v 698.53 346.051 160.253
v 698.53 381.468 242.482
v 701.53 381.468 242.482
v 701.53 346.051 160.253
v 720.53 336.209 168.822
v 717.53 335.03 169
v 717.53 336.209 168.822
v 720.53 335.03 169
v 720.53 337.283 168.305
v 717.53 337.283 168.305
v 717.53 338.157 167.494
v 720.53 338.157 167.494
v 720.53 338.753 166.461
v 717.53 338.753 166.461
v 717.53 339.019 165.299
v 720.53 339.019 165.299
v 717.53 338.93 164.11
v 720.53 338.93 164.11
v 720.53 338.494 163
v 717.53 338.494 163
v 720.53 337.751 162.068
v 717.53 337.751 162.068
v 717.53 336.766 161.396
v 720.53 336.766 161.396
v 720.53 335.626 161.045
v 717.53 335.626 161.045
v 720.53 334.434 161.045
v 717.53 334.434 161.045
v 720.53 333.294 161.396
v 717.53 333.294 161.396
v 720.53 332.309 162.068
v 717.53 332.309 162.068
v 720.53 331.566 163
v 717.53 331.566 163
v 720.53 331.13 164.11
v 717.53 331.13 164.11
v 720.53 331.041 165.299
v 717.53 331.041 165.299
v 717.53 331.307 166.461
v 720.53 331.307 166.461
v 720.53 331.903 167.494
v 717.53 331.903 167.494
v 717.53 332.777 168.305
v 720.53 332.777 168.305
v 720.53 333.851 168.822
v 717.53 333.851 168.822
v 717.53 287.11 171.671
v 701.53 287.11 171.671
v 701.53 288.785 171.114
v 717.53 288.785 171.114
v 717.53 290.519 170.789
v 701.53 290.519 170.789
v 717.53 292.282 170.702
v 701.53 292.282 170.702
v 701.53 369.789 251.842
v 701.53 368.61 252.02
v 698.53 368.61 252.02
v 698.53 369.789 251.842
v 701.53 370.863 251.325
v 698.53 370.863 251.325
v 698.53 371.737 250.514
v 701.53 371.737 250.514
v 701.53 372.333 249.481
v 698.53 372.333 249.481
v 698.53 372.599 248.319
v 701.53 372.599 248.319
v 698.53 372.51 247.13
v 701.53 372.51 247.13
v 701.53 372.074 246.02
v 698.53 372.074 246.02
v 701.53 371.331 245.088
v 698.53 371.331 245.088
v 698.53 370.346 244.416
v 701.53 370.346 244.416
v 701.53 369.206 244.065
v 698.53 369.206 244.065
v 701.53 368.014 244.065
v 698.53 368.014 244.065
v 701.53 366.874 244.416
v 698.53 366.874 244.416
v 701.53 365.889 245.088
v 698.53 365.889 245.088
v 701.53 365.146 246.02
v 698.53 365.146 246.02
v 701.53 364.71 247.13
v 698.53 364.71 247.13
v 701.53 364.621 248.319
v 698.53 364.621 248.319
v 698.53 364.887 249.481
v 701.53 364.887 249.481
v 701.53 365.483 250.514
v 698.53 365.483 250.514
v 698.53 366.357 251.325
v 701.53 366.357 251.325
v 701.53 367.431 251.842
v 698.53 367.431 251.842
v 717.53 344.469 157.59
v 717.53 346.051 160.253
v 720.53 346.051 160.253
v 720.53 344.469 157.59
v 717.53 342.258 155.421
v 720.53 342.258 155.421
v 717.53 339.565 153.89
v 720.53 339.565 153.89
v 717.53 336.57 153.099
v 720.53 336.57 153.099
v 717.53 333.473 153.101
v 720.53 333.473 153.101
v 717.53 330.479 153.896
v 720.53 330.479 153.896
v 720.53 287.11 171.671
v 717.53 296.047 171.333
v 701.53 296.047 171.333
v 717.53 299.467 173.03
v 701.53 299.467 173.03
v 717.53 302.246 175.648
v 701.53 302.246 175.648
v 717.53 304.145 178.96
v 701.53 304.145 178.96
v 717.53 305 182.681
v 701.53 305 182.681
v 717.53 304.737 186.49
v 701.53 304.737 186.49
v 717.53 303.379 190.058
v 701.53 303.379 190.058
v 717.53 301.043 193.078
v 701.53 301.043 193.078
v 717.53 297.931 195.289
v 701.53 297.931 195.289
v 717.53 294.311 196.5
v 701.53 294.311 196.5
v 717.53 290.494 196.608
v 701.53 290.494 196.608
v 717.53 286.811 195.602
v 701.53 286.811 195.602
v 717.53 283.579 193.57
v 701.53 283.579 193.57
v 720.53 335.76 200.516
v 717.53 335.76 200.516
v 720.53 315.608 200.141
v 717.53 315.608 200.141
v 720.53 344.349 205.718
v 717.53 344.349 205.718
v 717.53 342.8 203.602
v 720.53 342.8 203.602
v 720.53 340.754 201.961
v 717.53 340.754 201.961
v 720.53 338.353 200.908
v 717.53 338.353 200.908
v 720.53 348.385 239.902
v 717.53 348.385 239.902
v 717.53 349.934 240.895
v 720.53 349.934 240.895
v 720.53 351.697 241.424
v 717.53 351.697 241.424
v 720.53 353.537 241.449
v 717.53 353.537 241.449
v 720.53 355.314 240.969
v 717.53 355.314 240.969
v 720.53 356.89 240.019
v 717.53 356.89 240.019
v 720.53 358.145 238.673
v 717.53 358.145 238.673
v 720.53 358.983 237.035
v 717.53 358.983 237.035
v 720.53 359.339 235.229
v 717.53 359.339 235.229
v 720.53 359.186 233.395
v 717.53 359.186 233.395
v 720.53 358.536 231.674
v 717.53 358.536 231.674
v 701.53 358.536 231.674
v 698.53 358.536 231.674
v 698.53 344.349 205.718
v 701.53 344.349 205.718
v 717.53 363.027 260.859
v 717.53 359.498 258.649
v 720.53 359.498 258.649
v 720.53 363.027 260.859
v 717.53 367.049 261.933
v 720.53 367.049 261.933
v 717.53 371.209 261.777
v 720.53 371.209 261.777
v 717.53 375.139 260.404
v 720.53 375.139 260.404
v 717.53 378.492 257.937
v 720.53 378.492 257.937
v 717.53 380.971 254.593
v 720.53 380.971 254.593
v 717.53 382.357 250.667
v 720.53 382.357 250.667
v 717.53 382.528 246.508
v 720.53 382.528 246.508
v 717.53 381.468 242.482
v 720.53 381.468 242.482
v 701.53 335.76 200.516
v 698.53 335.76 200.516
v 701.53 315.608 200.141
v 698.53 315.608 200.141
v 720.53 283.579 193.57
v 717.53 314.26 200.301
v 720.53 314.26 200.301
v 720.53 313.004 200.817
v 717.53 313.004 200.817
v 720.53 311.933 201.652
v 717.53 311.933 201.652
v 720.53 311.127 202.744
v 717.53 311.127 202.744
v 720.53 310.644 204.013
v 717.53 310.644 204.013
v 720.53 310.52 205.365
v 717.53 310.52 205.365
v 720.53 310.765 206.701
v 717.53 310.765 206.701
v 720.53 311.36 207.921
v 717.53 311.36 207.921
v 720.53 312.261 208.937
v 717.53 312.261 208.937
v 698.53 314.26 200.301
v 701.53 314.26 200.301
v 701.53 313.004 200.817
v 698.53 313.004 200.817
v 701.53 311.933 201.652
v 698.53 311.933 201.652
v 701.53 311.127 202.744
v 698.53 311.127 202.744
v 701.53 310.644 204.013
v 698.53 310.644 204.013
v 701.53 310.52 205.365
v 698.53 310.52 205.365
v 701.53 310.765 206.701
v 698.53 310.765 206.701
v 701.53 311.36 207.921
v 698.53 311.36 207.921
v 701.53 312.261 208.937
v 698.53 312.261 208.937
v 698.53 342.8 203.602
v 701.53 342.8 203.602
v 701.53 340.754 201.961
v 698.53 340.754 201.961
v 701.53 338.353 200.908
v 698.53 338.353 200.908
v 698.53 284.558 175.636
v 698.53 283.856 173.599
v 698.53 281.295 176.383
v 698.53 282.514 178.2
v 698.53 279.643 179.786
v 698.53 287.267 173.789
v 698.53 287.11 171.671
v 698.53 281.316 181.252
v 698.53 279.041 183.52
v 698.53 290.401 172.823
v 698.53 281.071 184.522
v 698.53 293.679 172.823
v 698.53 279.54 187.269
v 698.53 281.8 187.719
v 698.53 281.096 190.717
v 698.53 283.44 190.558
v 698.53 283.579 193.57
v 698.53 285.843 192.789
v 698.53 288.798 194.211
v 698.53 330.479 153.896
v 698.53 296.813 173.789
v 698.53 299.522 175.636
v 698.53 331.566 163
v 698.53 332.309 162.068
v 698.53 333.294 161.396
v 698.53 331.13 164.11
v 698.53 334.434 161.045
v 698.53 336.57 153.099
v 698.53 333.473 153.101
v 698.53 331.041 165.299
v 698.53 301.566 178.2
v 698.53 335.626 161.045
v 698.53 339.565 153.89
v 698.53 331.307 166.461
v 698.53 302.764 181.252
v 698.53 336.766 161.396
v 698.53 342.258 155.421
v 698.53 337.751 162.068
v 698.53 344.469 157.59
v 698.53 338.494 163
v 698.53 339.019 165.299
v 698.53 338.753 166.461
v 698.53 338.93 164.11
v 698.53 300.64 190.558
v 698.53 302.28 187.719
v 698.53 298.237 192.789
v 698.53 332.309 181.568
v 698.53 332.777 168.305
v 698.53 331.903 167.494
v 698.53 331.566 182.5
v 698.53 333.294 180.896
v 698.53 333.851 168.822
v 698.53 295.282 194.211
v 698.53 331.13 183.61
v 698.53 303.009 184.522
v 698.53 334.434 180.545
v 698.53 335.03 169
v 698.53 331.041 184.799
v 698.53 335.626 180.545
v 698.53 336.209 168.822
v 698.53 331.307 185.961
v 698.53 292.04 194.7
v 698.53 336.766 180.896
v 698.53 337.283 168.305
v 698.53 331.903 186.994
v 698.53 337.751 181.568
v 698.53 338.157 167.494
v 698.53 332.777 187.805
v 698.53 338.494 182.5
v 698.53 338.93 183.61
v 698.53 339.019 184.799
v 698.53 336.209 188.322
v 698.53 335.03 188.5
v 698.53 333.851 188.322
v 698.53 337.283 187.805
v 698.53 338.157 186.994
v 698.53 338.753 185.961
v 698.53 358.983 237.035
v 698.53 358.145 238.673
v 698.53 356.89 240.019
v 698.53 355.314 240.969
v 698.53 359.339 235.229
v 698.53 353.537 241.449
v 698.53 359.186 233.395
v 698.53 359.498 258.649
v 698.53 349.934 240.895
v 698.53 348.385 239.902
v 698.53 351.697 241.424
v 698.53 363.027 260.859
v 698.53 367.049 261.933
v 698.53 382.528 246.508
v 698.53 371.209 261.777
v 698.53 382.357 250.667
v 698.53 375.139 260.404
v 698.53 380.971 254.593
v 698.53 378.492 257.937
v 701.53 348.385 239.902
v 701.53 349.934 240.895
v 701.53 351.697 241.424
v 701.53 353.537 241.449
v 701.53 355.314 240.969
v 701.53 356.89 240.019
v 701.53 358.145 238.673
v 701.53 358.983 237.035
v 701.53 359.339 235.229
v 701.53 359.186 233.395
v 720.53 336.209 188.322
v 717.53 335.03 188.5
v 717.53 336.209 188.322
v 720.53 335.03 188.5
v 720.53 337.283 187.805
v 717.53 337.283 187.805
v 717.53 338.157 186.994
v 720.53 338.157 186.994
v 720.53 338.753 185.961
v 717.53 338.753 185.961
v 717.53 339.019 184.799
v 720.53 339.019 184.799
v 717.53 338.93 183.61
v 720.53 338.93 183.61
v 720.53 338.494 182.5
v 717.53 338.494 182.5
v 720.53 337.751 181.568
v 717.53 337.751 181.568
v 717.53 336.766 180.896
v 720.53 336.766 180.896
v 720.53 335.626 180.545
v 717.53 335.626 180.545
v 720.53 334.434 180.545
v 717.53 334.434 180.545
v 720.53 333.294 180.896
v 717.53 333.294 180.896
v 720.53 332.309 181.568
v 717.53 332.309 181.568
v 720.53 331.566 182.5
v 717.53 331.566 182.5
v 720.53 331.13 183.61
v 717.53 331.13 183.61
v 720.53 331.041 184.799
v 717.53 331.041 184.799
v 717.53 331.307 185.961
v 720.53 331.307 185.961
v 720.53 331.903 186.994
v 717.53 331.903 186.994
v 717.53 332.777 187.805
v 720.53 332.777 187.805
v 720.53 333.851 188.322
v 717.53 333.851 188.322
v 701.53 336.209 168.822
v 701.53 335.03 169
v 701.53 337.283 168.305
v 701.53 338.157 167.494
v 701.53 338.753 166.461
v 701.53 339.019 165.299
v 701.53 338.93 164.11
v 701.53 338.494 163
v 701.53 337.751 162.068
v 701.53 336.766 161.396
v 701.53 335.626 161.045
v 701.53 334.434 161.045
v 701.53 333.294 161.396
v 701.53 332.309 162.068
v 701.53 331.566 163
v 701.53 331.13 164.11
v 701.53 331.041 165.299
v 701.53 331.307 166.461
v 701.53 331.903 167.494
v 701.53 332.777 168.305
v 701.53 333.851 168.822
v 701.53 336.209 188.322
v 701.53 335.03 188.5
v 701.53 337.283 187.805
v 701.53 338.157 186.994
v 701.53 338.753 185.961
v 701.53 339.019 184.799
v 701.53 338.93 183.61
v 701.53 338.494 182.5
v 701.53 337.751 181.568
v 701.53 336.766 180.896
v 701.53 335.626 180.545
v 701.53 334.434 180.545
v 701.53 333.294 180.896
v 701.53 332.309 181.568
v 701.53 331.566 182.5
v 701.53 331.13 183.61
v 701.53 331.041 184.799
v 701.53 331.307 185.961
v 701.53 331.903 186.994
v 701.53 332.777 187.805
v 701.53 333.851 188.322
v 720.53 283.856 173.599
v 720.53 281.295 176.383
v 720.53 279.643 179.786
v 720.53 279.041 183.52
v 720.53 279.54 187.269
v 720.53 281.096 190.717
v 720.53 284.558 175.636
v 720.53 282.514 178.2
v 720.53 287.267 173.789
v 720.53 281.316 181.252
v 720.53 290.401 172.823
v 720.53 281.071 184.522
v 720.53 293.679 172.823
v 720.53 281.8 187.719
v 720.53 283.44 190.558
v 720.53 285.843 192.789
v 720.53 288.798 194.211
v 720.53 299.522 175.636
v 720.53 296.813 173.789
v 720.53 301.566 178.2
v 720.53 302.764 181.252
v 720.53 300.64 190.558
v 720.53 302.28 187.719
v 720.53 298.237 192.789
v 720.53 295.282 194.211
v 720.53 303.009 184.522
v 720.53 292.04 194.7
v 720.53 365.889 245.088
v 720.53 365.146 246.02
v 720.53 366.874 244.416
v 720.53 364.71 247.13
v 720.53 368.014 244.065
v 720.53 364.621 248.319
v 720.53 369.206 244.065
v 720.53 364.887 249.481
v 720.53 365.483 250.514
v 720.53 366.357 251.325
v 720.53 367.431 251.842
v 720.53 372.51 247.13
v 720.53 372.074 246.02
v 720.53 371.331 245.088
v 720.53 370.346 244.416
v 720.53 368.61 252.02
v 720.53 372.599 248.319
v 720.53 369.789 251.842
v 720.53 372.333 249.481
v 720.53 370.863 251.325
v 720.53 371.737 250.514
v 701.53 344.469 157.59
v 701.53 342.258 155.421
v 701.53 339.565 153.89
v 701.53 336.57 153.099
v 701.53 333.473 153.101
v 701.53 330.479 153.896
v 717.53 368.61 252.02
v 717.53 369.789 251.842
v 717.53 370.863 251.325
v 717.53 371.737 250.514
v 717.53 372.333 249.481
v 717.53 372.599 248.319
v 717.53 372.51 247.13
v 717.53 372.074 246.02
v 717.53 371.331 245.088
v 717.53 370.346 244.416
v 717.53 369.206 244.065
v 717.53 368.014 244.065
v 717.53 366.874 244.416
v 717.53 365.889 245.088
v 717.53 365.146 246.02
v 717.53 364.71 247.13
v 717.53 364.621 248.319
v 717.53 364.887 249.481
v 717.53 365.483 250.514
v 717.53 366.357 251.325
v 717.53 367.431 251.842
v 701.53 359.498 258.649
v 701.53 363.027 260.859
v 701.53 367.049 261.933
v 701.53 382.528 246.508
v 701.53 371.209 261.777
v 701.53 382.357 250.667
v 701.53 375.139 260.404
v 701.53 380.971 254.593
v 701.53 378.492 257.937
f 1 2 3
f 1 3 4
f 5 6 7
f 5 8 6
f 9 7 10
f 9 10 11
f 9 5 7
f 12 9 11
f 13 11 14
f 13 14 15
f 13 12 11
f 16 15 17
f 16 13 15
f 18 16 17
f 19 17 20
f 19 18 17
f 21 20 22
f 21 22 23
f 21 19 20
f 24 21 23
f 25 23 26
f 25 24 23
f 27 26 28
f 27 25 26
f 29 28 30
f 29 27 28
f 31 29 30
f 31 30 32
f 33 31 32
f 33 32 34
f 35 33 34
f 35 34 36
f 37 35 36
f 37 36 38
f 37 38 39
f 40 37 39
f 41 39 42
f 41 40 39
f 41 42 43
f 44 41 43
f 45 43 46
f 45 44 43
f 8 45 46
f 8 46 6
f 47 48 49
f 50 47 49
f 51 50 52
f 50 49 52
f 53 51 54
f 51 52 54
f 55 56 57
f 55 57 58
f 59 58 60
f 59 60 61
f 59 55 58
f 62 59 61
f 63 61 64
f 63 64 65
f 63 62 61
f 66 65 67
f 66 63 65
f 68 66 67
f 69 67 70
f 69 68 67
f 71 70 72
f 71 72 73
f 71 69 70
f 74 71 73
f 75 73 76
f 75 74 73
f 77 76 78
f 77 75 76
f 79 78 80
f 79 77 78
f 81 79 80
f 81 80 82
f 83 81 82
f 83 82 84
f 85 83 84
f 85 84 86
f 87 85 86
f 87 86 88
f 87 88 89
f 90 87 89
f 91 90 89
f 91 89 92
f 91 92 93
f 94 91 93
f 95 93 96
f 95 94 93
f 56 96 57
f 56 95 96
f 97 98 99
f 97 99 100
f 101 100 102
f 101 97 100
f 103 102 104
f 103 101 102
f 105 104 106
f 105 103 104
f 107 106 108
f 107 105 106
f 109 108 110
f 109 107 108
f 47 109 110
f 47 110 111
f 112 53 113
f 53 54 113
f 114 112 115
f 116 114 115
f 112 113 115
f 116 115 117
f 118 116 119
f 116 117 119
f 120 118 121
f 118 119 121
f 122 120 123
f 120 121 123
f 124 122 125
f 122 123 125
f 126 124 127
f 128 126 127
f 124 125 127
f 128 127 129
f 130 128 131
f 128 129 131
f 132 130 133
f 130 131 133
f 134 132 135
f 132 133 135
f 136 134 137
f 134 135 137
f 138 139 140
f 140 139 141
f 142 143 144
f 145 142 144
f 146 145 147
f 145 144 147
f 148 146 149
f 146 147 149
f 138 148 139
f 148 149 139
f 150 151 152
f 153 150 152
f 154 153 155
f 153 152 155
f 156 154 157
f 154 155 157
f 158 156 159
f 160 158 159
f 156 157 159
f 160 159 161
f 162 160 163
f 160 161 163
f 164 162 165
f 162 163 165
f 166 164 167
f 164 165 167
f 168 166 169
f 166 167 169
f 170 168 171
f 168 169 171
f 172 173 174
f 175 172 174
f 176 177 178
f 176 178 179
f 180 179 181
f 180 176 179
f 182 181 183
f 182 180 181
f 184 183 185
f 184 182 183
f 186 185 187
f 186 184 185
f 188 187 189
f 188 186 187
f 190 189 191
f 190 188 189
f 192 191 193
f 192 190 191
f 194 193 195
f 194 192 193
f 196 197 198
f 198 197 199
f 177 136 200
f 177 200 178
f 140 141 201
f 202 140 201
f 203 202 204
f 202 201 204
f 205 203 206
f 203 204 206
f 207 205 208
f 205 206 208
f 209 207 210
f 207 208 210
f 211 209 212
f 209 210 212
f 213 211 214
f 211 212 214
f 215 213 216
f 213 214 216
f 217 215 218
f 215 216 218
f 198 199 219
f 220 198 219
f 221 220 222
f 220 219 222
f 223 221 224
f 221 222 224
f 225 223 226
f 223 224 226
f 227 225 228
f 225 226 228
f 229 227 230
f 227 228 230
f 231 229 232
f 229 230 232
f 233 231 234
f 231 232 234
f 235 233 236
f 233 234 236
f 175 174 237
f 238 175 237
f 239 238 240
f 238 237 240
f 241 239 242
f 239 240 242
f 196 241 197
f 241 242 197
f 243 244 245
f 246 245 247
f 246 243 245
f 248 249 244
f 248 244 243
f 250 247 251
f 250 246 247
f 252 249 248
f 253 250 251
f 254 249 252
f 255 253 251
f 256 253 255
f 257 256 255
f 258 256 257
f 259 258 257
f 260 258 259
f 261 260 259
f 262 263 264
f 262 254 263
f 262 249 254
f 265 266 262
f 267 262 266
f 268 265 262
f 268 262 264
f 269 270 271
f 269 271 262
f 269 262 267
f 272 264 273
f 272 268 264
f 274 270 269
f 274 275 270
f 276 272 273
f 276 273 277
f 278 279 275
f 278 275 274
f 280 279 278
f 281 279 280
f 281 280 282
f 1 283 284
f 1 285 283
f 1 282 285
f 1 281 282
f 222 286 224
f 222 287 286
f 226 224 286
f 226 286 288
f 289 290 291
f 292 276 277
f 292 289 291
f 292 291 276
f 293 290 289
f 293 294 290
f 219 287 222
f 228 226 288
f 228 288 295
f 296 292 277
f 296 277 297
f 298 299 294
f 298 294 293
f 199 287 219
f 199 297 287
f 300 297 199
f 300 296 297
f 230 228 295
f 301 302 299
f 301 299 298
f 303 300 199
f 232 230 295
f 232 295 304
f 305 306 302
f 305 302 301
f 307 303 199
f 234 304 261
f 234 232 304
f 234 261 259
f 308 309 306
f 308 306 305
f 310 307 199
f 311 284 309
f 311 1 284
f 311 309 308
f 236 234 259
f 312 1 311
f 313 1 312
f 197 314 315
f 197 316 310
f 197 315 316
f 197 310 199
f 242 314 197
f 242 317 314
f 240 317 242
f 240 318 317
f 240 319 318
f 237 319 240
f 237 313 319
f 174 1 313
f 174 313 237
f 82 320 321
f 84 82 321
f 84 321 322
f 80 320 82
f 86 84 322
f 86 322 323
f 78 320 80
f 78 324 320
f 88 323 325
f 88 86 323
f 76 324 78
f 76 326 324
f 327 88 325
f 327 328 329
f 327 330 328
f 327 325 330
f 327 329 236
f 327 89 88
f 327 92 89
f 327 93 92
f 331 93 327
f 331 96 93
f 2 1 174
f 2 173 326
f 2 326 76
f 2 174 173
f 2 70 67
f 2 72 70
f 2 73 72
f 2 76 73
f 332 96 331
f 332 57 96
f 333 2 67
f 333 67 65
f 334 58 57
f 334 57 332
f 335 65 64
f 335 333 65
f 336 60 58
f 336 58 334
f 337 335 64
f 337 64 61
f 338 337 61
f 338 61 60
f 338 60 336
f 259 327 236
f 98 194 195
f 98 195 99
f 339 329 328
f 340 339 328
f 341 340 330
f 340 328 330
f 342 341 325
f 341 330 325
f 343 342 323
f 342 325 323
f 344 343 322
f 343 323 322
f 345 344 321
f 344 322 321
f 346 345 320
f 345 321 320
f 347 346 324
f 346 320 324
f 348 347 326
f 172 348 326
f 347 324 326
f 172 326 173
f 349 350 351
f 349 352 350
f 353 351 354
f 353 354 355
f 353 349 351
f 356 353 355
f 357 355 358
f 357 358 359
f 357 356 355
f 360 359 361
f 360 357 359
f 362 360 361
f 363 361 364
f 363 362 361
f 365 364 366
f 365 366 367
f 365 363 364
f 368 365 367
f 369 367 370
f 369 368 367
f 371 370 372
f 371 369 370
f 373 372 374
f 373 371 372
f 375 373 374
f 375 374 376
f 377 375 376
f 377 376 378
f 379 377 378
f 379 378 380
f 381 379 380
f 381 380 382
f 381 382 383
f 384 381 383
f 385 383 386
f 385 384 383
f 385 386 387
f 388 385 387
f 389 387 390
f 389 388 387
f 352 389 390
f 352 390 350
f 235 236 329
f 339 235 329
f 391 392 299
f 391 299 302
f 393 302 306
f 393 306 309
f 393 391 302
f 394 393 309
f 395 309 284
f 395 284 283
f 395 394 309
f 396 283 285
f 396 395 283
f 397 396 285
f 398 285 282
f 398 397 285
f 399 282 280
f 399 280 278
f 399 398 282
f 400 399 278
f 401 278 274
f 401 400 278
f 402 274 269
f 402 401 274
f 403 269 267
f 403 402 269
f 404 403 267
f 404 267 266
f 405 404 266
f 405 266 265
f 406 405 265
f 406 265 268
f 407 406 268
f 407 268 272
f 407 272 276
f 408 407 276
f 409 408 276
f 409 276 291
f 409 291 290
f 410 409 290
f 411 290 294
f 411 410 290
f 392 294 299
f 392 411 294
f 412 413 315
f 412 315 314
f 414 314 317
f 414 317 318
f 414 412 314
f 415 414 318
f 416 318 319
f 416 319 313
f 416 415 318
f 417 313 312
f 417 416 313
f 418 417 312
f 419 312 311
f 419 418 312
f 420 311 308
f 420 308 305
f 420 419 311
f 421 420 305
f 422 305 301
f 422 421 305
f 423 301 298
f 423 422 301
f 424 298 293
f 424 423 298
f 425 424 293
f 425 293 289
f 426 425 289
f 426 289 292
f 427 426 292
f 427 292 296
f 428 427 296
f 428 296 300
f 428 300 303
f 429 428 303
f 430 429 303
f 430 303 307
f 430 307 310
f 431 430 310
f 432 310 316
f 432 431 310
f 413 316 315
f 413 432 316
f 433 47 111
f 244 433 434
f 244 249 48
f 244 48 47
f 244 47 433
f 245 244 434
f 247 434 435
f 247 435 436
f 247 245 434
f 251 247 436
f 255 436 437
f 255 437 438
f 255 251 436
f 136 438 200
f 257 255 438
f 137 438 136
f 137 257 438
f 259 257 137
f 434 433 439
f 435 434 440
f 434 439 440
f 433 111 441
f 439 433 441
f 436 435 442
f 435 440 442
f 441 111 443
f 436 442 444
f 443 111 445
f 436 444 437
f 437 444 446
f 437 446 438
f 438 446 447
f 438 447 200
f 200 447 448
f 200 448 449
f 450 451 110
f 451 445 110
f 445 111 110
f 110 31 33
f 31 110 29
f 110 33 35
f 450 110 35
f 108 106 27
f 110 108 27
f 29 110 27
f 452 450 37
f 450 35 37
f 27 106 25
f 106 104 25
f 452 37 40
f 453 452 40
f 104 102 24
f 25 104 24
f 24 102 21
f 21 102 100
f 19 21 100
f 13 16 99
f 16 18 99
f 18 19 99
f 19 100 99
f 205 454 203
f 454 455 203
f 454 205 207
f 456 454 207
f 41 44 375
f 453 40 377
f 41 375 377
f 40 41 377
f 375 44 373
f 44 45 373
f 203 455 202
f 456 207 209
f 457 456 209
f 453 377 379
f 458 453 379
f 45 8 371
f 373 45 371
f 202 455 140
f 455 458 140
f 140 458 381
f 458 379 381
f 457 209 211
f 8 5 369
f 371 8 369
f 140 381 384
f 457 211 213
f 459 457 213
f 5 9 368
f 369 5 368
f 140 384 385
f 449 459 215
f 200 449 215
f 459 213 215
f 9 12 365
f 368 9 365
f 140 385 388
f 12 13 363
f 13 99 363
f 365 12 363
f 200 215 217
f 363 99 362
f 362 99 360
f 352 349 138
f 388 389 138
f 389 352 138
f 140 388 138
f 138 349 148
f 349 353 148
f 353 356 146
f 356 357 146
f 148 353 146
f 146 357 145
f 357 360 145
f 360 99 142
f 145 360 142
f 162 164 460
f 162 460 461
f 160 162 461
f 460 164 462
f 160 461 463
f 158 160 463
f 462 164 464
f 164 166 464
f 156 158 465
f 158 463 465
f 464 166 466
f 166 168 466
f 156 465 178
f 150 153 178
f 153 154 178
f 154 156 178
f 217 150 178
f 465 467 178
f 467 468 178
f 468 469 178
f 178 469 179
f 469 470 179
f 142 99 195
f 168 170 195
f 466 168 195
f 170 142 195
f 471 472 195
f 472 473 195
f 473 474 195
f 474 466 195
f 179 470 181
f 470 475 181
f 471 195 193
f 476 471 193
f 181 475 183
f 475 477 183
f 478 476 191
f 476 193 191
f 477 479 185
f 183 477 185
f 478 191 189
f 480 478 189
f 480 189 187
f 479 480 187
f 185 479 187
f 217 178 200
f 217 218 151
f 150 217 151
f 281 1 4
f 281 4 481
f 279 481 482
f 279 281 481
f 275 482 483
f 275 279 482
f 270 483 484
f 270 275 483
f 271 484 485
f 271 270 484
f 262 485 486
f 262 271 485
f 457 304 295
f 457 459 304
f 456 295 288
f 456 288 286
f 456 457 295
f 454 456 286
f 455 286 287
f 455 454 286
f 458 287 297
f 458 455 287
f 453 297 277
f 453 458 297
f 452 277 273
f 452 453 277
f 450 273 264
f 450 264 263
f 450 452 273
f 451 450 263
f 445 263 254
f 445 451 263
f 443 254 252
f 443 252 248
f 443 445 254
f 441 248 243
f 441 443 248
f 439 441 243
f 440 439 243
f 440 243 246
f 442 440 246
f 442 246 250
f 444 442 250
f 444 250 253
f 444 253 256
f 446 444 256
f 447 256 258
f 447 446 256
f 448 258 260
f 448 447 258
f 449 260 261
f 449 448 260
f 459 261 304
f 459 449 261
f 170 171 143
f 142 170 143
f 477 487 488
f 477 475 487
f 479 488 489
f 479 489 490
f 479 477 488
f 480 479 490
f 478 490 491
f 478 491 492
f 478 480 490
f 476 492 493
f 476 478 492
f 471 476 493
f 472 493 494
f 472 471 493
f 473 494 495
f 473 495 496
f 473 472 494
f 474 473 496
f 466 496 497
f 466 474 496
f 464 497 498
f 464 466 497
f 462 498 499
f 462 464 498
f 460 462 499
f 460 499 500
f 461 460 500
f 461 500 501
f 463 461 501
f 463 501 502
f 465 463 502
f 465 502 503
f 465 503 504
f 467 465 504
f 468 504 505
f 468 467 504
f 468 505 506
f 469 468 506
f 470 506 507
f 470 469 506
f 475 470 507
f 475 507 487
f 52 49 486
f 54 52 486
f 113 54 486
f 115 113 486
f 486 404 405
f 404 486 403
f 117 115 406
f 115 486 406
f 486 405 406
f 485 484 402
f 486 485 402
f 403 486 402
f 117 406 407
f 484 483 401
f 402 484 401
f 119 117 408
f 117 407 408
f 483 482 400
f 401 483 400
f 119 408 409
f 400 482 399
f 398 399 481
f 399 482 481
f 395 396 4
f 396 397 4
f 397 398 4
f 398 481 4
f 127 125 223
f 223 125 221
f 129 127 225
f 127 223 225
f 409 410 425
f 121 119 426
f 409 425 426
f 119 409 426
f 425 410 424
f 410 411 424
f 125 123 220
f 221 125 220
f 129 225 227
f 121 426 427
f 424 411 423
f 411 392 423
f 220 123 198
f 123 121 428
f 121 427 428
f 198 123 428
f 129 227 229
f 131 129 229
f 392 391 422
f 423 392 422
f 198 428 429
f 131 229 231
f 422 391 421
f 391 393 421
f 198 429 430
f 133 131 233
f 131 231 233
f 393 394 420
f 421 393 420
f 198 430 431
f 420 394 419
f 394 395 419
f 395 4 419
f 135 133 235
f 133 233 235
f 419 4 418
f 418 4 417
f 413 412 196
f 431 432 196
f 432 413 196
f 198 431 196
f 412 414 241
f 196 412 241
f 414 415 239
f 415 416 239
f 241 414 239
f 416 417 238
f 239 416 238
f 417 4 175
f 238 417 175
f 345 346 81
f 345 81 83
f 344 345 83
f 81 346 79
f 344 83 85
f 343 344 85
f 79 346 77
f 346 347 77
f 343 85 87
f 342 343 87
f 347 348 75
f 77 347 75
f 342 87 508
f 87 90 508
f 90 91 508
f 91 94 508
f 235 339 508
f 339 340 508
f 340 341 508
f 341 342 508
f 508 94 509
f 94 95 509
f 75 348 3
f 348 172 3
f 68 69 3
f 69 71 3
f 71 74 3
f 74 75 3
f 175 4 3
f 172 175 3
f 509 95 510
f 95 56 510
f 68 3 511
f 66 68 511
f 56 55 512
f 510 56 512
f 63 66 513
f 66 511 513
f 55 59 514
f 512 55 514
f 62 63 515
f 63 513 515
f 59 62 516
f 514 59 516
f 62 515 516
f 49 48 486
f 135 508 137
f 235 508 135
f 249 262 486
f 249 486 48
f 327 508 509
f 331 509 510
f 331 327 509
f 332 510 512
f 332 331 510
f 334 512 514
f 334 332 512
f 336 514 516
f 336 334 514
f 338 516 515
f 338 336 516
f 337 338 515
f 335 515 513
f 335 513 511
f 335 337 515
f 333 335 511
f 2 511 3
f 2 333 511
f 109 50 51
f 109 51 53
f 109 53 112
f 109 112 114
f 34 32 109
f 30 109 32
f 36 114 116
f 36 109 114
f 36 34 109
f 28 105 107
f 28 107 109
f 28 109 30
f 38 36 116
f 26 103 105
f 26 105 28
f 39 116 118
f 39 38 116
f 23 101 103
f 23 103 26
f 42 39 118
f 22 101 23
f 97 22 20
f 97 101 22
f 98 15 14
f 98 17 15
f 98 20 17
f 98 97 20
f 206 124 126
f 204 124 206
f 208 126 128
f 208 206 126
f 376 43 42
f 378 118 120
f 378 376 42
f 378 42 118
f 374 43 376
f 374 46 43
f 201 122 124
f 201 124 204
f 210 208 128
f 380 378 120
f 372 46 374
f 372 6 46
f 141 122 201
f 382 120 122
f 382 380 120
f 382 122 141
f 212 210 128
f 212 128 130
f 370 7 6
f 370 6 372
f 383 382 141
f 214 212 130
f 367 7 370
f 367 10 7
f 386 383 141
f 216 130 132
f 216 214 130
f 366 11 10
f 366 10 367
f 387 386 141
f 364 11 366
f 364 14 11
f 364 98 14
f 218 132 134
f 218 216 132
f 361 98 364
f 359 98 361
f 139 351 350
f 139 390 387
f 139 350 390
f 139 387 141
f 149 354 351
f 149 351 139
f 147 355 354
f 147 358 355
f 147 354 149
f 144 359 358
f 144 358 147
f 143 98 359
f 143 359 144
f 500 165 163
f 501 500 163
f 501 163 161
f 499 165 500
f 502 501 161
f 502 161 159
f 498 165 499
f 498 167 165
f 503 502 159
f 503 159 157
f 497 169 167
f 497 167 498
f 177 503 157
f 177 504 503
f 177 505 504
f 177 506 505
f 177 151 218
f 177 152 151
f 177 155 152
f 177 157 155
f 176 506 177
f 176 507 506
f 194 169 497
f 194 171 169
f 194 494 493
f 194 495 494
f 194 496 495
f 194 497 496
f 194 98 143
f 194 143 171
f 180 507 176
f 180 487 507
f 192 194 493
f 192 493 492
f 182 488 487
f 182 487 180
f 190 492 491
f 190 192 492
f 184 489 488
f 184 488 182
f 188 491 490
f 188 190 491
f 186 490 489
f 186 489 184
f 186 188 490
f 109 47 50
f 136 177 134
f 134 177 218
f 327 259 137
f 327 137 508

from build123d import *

# Parameters (mm, degrees)
SKETCH1_R               = 4
SKETCH1_R_2             = 11
BOSS_EXTRUDE2_DEPTH     = 11
SKETCH1_8_R             = 4
CUT_EXTRUDE1_DEPTH      = 8
CUT_EXTRUDE2_DEPTH      = 1
CUT_EXTRUDE2_DEPTH_BACK = 23
SKETCH6_R               = 4
BOSS_EXTRUDE8_DEPTH     = 11
SKETCH6_6_R             = 4
CUT_EXTRUDE3_DEPTH      = 8


with BuildPart() as part:
    # Sketch1 → Boss-Extrude2 (new body, symmetric)
    with BuildSketch(Plane.ZY.offset(-709.53)):
        with BuildLine():
            Line((193.569972926, 283.579288774), (258.649201612, 359.498464834))
            ThreePointArc((258.649201612, 359.498464834), (258.8956606, 377.425895105), (241.305287216, 380.894650269))
            Line((241.305287216, 380.894650269), (178.264909558, 346.43717525))
            ThreePointArc((178.264909558, 346.43717525), (173.380579242, 341.764870601), (171.502250327, 335.271874849))
            Line((171.502250327, 335.271874849), (170.702250327, 292.281874849))
            ThreePointArc((170.702250327, 292.281874849), (179.076203082, 279.89008222), (193.569972926, 283.579288774))
        make_face()
        with Locations((248.02, 368.61)):
            Circle(SKETCH1_R, mode=Mode.SUBTRACT)
        with Locations((184.5, 335.03)):
            Circle(SKETCH1_R, mode=Mode.SUBTRACT)
        with Locations((183.7, 292.04)):
            Circle(SKETCH1_R_2, mode=Mode.SUBTRACT)
    extrude(amount=BOSS_EXTRUDE2_DEPTH, both=True)

    # Sketch1_8 → Cut-Extrude1 (cut, symmetric)
    with BuildSketch(Plane.ZY.offset(-709.53)):
        with BuildLine():
            Line((193.569972926, 283.579288774), (258.649201612, 359.498464834))
            ThreePointArc((258.649201612, 359.498464834), (258.8956606, 377.425895105), (241.305287216, 380.894650269))
            Line((241.305287216, 380.894650269), (178.264909558, 346.43717525))
            ThreePointArc((178.264909558, 346.43717525), (173.380579242, 341.764870601), (171.502250327, 335.271874849))
            Line((171.502250327, 335.271874849), (170.702250327, 292.281874849))
            ThreePointArc((170.702250327, 292.281874849), (188.323796918, 304.18991778), (193.569972926, 283.579288774))
        make_face()
        with Locations((248.02, 368.61)):
            Circle(SKETCH1_8_R, mode=Mode.SUBTRACT)
        with Locations((184.5, 335.03)):
            Circle(SKETCH1_8_R, mode=Mode.SUBTRACT)
    extrude(amount=CUT_EXTRUDE1_DEPTH, both=True, mode=Mode.SUBTRACT)

    # Sketch5 → Cut-Extrude2 (cut, two sides)
    with BuildSketch(Plane.ZY.offset(-698.53)) as cut_extrude2_sk:
        with BuildLine():
            Line((231.673739179, 358.535602781), (205.718398062, 344.348576127))
            ThreePointArc((205.718398062, 344.348576127), (201.961220896, 340.754495628), (200.5163525, 335.75988351))
            Line((200.5163525, 335.75988351), (200.141351056, 315.608243405))
            ThreePointArc((200.141351056, 315.608243405), (203.362102115, 310.842169317), (208.936628978, 312.261094915))
            Line((208.936628978, 312.261094915), (239.902269766, 348.384539863))
            ThreePointArc((239.902269766, 348.384539863), (240.019198117, 356.889909813), (231.673739179, 358.535602781))
        make_face()
    extrude(amount=CUT_EXTRUDE2_DEPTH, mode=Mode.SUBTRACT)
    extrude(cut_extrude2_sk.sketch, amount=-CUT_EXTRUDE2_DEPTH_BACK, mode=Mode.SUBTRACT)

    # Sketch6 → Boss-Extrude8 (add, symmetric)
    with BuildSketch(Plane.ZY.offset(-709.53)):
        with BuildLine():
            ThreePointArc((160.253054899, 346.051184701), (153.890022283, 339.565239259), (153.896376335, 330.479226273))
            Line((153.896376335, 330.479226273), (171.671074363, 287.109995129))
            ThreePointArc((171.671074363, 287.109995129), (170.922257468, 289.64640526), (170.702250327, 292.281874849))
            Line((170.702250327, 292.281874849), (171.502250327, 335.271874849))
            ThreePointArc((171.502250327, 335.271874849), (173.380579242, 341.764870601), (178.264909558, 346.43717525))
            Line((178.264909558, 346.43717525), (241.305287216, 380.894650269))
            ThreePointArc((241.305287216, 380.894650269), (241.886887594, 381.195107557), (242.481897383, 381.468048818))
            Line((242.481897383, 381.468048818), (160.253054899, 346.051184701))
        make_face()
        with Locations((165, 335.03)):
            Circle(SKETCH6_R, mode=Mode.SUBTRACT)
    extrude(amount=BOSS_EXTRUDE8_DEPTH, both=True)

    # Sketch6_6 → Cut-Extrude3 (cut, symmetric)
    with BuildSketch(Plane.ZY.offset(-709.53)):
        with BuildLine():
            ThreePointArc((160.253054899, 346.051184701), (153.890022283, 339.565239259), (153.896376335, 330.479226273))
            Line((153.896376335, 330.479226273), (171.671074363, 287.109995129))
            ThreePointArc((171.671074363, 287.109995129), (170.922257468, 289.64640526), (170.702250327, 292.281874849))
            Line((170.702250327, 292.281874849), (171.502250327, 335.271874849))
            ThreePointArc((171.502250327, 335.271874849), (173.380579242, 341.764870601), (178.264909558, 346.43717525))
            Line((178.264909558, 346.43717525), (241.305287216, 380.894650269))
            ThreePointArc((241.305287216, 380.894650269), (241.886887594, 381.195107557), (242.481897383, 381.468048818))
            Line((242.481897383, 381.468048818), (160.253054899, 346.051184701))
        make_face()
        with Locations((165, 335.03)):
            Circle(SKETCH6_6_R, mode=Mode.SUBTRACT)
    extrude(amount=CUT_EXTRUDE3_DEPTH, both=True, mode=Mode.SUBTRACT)


solid = part.part
